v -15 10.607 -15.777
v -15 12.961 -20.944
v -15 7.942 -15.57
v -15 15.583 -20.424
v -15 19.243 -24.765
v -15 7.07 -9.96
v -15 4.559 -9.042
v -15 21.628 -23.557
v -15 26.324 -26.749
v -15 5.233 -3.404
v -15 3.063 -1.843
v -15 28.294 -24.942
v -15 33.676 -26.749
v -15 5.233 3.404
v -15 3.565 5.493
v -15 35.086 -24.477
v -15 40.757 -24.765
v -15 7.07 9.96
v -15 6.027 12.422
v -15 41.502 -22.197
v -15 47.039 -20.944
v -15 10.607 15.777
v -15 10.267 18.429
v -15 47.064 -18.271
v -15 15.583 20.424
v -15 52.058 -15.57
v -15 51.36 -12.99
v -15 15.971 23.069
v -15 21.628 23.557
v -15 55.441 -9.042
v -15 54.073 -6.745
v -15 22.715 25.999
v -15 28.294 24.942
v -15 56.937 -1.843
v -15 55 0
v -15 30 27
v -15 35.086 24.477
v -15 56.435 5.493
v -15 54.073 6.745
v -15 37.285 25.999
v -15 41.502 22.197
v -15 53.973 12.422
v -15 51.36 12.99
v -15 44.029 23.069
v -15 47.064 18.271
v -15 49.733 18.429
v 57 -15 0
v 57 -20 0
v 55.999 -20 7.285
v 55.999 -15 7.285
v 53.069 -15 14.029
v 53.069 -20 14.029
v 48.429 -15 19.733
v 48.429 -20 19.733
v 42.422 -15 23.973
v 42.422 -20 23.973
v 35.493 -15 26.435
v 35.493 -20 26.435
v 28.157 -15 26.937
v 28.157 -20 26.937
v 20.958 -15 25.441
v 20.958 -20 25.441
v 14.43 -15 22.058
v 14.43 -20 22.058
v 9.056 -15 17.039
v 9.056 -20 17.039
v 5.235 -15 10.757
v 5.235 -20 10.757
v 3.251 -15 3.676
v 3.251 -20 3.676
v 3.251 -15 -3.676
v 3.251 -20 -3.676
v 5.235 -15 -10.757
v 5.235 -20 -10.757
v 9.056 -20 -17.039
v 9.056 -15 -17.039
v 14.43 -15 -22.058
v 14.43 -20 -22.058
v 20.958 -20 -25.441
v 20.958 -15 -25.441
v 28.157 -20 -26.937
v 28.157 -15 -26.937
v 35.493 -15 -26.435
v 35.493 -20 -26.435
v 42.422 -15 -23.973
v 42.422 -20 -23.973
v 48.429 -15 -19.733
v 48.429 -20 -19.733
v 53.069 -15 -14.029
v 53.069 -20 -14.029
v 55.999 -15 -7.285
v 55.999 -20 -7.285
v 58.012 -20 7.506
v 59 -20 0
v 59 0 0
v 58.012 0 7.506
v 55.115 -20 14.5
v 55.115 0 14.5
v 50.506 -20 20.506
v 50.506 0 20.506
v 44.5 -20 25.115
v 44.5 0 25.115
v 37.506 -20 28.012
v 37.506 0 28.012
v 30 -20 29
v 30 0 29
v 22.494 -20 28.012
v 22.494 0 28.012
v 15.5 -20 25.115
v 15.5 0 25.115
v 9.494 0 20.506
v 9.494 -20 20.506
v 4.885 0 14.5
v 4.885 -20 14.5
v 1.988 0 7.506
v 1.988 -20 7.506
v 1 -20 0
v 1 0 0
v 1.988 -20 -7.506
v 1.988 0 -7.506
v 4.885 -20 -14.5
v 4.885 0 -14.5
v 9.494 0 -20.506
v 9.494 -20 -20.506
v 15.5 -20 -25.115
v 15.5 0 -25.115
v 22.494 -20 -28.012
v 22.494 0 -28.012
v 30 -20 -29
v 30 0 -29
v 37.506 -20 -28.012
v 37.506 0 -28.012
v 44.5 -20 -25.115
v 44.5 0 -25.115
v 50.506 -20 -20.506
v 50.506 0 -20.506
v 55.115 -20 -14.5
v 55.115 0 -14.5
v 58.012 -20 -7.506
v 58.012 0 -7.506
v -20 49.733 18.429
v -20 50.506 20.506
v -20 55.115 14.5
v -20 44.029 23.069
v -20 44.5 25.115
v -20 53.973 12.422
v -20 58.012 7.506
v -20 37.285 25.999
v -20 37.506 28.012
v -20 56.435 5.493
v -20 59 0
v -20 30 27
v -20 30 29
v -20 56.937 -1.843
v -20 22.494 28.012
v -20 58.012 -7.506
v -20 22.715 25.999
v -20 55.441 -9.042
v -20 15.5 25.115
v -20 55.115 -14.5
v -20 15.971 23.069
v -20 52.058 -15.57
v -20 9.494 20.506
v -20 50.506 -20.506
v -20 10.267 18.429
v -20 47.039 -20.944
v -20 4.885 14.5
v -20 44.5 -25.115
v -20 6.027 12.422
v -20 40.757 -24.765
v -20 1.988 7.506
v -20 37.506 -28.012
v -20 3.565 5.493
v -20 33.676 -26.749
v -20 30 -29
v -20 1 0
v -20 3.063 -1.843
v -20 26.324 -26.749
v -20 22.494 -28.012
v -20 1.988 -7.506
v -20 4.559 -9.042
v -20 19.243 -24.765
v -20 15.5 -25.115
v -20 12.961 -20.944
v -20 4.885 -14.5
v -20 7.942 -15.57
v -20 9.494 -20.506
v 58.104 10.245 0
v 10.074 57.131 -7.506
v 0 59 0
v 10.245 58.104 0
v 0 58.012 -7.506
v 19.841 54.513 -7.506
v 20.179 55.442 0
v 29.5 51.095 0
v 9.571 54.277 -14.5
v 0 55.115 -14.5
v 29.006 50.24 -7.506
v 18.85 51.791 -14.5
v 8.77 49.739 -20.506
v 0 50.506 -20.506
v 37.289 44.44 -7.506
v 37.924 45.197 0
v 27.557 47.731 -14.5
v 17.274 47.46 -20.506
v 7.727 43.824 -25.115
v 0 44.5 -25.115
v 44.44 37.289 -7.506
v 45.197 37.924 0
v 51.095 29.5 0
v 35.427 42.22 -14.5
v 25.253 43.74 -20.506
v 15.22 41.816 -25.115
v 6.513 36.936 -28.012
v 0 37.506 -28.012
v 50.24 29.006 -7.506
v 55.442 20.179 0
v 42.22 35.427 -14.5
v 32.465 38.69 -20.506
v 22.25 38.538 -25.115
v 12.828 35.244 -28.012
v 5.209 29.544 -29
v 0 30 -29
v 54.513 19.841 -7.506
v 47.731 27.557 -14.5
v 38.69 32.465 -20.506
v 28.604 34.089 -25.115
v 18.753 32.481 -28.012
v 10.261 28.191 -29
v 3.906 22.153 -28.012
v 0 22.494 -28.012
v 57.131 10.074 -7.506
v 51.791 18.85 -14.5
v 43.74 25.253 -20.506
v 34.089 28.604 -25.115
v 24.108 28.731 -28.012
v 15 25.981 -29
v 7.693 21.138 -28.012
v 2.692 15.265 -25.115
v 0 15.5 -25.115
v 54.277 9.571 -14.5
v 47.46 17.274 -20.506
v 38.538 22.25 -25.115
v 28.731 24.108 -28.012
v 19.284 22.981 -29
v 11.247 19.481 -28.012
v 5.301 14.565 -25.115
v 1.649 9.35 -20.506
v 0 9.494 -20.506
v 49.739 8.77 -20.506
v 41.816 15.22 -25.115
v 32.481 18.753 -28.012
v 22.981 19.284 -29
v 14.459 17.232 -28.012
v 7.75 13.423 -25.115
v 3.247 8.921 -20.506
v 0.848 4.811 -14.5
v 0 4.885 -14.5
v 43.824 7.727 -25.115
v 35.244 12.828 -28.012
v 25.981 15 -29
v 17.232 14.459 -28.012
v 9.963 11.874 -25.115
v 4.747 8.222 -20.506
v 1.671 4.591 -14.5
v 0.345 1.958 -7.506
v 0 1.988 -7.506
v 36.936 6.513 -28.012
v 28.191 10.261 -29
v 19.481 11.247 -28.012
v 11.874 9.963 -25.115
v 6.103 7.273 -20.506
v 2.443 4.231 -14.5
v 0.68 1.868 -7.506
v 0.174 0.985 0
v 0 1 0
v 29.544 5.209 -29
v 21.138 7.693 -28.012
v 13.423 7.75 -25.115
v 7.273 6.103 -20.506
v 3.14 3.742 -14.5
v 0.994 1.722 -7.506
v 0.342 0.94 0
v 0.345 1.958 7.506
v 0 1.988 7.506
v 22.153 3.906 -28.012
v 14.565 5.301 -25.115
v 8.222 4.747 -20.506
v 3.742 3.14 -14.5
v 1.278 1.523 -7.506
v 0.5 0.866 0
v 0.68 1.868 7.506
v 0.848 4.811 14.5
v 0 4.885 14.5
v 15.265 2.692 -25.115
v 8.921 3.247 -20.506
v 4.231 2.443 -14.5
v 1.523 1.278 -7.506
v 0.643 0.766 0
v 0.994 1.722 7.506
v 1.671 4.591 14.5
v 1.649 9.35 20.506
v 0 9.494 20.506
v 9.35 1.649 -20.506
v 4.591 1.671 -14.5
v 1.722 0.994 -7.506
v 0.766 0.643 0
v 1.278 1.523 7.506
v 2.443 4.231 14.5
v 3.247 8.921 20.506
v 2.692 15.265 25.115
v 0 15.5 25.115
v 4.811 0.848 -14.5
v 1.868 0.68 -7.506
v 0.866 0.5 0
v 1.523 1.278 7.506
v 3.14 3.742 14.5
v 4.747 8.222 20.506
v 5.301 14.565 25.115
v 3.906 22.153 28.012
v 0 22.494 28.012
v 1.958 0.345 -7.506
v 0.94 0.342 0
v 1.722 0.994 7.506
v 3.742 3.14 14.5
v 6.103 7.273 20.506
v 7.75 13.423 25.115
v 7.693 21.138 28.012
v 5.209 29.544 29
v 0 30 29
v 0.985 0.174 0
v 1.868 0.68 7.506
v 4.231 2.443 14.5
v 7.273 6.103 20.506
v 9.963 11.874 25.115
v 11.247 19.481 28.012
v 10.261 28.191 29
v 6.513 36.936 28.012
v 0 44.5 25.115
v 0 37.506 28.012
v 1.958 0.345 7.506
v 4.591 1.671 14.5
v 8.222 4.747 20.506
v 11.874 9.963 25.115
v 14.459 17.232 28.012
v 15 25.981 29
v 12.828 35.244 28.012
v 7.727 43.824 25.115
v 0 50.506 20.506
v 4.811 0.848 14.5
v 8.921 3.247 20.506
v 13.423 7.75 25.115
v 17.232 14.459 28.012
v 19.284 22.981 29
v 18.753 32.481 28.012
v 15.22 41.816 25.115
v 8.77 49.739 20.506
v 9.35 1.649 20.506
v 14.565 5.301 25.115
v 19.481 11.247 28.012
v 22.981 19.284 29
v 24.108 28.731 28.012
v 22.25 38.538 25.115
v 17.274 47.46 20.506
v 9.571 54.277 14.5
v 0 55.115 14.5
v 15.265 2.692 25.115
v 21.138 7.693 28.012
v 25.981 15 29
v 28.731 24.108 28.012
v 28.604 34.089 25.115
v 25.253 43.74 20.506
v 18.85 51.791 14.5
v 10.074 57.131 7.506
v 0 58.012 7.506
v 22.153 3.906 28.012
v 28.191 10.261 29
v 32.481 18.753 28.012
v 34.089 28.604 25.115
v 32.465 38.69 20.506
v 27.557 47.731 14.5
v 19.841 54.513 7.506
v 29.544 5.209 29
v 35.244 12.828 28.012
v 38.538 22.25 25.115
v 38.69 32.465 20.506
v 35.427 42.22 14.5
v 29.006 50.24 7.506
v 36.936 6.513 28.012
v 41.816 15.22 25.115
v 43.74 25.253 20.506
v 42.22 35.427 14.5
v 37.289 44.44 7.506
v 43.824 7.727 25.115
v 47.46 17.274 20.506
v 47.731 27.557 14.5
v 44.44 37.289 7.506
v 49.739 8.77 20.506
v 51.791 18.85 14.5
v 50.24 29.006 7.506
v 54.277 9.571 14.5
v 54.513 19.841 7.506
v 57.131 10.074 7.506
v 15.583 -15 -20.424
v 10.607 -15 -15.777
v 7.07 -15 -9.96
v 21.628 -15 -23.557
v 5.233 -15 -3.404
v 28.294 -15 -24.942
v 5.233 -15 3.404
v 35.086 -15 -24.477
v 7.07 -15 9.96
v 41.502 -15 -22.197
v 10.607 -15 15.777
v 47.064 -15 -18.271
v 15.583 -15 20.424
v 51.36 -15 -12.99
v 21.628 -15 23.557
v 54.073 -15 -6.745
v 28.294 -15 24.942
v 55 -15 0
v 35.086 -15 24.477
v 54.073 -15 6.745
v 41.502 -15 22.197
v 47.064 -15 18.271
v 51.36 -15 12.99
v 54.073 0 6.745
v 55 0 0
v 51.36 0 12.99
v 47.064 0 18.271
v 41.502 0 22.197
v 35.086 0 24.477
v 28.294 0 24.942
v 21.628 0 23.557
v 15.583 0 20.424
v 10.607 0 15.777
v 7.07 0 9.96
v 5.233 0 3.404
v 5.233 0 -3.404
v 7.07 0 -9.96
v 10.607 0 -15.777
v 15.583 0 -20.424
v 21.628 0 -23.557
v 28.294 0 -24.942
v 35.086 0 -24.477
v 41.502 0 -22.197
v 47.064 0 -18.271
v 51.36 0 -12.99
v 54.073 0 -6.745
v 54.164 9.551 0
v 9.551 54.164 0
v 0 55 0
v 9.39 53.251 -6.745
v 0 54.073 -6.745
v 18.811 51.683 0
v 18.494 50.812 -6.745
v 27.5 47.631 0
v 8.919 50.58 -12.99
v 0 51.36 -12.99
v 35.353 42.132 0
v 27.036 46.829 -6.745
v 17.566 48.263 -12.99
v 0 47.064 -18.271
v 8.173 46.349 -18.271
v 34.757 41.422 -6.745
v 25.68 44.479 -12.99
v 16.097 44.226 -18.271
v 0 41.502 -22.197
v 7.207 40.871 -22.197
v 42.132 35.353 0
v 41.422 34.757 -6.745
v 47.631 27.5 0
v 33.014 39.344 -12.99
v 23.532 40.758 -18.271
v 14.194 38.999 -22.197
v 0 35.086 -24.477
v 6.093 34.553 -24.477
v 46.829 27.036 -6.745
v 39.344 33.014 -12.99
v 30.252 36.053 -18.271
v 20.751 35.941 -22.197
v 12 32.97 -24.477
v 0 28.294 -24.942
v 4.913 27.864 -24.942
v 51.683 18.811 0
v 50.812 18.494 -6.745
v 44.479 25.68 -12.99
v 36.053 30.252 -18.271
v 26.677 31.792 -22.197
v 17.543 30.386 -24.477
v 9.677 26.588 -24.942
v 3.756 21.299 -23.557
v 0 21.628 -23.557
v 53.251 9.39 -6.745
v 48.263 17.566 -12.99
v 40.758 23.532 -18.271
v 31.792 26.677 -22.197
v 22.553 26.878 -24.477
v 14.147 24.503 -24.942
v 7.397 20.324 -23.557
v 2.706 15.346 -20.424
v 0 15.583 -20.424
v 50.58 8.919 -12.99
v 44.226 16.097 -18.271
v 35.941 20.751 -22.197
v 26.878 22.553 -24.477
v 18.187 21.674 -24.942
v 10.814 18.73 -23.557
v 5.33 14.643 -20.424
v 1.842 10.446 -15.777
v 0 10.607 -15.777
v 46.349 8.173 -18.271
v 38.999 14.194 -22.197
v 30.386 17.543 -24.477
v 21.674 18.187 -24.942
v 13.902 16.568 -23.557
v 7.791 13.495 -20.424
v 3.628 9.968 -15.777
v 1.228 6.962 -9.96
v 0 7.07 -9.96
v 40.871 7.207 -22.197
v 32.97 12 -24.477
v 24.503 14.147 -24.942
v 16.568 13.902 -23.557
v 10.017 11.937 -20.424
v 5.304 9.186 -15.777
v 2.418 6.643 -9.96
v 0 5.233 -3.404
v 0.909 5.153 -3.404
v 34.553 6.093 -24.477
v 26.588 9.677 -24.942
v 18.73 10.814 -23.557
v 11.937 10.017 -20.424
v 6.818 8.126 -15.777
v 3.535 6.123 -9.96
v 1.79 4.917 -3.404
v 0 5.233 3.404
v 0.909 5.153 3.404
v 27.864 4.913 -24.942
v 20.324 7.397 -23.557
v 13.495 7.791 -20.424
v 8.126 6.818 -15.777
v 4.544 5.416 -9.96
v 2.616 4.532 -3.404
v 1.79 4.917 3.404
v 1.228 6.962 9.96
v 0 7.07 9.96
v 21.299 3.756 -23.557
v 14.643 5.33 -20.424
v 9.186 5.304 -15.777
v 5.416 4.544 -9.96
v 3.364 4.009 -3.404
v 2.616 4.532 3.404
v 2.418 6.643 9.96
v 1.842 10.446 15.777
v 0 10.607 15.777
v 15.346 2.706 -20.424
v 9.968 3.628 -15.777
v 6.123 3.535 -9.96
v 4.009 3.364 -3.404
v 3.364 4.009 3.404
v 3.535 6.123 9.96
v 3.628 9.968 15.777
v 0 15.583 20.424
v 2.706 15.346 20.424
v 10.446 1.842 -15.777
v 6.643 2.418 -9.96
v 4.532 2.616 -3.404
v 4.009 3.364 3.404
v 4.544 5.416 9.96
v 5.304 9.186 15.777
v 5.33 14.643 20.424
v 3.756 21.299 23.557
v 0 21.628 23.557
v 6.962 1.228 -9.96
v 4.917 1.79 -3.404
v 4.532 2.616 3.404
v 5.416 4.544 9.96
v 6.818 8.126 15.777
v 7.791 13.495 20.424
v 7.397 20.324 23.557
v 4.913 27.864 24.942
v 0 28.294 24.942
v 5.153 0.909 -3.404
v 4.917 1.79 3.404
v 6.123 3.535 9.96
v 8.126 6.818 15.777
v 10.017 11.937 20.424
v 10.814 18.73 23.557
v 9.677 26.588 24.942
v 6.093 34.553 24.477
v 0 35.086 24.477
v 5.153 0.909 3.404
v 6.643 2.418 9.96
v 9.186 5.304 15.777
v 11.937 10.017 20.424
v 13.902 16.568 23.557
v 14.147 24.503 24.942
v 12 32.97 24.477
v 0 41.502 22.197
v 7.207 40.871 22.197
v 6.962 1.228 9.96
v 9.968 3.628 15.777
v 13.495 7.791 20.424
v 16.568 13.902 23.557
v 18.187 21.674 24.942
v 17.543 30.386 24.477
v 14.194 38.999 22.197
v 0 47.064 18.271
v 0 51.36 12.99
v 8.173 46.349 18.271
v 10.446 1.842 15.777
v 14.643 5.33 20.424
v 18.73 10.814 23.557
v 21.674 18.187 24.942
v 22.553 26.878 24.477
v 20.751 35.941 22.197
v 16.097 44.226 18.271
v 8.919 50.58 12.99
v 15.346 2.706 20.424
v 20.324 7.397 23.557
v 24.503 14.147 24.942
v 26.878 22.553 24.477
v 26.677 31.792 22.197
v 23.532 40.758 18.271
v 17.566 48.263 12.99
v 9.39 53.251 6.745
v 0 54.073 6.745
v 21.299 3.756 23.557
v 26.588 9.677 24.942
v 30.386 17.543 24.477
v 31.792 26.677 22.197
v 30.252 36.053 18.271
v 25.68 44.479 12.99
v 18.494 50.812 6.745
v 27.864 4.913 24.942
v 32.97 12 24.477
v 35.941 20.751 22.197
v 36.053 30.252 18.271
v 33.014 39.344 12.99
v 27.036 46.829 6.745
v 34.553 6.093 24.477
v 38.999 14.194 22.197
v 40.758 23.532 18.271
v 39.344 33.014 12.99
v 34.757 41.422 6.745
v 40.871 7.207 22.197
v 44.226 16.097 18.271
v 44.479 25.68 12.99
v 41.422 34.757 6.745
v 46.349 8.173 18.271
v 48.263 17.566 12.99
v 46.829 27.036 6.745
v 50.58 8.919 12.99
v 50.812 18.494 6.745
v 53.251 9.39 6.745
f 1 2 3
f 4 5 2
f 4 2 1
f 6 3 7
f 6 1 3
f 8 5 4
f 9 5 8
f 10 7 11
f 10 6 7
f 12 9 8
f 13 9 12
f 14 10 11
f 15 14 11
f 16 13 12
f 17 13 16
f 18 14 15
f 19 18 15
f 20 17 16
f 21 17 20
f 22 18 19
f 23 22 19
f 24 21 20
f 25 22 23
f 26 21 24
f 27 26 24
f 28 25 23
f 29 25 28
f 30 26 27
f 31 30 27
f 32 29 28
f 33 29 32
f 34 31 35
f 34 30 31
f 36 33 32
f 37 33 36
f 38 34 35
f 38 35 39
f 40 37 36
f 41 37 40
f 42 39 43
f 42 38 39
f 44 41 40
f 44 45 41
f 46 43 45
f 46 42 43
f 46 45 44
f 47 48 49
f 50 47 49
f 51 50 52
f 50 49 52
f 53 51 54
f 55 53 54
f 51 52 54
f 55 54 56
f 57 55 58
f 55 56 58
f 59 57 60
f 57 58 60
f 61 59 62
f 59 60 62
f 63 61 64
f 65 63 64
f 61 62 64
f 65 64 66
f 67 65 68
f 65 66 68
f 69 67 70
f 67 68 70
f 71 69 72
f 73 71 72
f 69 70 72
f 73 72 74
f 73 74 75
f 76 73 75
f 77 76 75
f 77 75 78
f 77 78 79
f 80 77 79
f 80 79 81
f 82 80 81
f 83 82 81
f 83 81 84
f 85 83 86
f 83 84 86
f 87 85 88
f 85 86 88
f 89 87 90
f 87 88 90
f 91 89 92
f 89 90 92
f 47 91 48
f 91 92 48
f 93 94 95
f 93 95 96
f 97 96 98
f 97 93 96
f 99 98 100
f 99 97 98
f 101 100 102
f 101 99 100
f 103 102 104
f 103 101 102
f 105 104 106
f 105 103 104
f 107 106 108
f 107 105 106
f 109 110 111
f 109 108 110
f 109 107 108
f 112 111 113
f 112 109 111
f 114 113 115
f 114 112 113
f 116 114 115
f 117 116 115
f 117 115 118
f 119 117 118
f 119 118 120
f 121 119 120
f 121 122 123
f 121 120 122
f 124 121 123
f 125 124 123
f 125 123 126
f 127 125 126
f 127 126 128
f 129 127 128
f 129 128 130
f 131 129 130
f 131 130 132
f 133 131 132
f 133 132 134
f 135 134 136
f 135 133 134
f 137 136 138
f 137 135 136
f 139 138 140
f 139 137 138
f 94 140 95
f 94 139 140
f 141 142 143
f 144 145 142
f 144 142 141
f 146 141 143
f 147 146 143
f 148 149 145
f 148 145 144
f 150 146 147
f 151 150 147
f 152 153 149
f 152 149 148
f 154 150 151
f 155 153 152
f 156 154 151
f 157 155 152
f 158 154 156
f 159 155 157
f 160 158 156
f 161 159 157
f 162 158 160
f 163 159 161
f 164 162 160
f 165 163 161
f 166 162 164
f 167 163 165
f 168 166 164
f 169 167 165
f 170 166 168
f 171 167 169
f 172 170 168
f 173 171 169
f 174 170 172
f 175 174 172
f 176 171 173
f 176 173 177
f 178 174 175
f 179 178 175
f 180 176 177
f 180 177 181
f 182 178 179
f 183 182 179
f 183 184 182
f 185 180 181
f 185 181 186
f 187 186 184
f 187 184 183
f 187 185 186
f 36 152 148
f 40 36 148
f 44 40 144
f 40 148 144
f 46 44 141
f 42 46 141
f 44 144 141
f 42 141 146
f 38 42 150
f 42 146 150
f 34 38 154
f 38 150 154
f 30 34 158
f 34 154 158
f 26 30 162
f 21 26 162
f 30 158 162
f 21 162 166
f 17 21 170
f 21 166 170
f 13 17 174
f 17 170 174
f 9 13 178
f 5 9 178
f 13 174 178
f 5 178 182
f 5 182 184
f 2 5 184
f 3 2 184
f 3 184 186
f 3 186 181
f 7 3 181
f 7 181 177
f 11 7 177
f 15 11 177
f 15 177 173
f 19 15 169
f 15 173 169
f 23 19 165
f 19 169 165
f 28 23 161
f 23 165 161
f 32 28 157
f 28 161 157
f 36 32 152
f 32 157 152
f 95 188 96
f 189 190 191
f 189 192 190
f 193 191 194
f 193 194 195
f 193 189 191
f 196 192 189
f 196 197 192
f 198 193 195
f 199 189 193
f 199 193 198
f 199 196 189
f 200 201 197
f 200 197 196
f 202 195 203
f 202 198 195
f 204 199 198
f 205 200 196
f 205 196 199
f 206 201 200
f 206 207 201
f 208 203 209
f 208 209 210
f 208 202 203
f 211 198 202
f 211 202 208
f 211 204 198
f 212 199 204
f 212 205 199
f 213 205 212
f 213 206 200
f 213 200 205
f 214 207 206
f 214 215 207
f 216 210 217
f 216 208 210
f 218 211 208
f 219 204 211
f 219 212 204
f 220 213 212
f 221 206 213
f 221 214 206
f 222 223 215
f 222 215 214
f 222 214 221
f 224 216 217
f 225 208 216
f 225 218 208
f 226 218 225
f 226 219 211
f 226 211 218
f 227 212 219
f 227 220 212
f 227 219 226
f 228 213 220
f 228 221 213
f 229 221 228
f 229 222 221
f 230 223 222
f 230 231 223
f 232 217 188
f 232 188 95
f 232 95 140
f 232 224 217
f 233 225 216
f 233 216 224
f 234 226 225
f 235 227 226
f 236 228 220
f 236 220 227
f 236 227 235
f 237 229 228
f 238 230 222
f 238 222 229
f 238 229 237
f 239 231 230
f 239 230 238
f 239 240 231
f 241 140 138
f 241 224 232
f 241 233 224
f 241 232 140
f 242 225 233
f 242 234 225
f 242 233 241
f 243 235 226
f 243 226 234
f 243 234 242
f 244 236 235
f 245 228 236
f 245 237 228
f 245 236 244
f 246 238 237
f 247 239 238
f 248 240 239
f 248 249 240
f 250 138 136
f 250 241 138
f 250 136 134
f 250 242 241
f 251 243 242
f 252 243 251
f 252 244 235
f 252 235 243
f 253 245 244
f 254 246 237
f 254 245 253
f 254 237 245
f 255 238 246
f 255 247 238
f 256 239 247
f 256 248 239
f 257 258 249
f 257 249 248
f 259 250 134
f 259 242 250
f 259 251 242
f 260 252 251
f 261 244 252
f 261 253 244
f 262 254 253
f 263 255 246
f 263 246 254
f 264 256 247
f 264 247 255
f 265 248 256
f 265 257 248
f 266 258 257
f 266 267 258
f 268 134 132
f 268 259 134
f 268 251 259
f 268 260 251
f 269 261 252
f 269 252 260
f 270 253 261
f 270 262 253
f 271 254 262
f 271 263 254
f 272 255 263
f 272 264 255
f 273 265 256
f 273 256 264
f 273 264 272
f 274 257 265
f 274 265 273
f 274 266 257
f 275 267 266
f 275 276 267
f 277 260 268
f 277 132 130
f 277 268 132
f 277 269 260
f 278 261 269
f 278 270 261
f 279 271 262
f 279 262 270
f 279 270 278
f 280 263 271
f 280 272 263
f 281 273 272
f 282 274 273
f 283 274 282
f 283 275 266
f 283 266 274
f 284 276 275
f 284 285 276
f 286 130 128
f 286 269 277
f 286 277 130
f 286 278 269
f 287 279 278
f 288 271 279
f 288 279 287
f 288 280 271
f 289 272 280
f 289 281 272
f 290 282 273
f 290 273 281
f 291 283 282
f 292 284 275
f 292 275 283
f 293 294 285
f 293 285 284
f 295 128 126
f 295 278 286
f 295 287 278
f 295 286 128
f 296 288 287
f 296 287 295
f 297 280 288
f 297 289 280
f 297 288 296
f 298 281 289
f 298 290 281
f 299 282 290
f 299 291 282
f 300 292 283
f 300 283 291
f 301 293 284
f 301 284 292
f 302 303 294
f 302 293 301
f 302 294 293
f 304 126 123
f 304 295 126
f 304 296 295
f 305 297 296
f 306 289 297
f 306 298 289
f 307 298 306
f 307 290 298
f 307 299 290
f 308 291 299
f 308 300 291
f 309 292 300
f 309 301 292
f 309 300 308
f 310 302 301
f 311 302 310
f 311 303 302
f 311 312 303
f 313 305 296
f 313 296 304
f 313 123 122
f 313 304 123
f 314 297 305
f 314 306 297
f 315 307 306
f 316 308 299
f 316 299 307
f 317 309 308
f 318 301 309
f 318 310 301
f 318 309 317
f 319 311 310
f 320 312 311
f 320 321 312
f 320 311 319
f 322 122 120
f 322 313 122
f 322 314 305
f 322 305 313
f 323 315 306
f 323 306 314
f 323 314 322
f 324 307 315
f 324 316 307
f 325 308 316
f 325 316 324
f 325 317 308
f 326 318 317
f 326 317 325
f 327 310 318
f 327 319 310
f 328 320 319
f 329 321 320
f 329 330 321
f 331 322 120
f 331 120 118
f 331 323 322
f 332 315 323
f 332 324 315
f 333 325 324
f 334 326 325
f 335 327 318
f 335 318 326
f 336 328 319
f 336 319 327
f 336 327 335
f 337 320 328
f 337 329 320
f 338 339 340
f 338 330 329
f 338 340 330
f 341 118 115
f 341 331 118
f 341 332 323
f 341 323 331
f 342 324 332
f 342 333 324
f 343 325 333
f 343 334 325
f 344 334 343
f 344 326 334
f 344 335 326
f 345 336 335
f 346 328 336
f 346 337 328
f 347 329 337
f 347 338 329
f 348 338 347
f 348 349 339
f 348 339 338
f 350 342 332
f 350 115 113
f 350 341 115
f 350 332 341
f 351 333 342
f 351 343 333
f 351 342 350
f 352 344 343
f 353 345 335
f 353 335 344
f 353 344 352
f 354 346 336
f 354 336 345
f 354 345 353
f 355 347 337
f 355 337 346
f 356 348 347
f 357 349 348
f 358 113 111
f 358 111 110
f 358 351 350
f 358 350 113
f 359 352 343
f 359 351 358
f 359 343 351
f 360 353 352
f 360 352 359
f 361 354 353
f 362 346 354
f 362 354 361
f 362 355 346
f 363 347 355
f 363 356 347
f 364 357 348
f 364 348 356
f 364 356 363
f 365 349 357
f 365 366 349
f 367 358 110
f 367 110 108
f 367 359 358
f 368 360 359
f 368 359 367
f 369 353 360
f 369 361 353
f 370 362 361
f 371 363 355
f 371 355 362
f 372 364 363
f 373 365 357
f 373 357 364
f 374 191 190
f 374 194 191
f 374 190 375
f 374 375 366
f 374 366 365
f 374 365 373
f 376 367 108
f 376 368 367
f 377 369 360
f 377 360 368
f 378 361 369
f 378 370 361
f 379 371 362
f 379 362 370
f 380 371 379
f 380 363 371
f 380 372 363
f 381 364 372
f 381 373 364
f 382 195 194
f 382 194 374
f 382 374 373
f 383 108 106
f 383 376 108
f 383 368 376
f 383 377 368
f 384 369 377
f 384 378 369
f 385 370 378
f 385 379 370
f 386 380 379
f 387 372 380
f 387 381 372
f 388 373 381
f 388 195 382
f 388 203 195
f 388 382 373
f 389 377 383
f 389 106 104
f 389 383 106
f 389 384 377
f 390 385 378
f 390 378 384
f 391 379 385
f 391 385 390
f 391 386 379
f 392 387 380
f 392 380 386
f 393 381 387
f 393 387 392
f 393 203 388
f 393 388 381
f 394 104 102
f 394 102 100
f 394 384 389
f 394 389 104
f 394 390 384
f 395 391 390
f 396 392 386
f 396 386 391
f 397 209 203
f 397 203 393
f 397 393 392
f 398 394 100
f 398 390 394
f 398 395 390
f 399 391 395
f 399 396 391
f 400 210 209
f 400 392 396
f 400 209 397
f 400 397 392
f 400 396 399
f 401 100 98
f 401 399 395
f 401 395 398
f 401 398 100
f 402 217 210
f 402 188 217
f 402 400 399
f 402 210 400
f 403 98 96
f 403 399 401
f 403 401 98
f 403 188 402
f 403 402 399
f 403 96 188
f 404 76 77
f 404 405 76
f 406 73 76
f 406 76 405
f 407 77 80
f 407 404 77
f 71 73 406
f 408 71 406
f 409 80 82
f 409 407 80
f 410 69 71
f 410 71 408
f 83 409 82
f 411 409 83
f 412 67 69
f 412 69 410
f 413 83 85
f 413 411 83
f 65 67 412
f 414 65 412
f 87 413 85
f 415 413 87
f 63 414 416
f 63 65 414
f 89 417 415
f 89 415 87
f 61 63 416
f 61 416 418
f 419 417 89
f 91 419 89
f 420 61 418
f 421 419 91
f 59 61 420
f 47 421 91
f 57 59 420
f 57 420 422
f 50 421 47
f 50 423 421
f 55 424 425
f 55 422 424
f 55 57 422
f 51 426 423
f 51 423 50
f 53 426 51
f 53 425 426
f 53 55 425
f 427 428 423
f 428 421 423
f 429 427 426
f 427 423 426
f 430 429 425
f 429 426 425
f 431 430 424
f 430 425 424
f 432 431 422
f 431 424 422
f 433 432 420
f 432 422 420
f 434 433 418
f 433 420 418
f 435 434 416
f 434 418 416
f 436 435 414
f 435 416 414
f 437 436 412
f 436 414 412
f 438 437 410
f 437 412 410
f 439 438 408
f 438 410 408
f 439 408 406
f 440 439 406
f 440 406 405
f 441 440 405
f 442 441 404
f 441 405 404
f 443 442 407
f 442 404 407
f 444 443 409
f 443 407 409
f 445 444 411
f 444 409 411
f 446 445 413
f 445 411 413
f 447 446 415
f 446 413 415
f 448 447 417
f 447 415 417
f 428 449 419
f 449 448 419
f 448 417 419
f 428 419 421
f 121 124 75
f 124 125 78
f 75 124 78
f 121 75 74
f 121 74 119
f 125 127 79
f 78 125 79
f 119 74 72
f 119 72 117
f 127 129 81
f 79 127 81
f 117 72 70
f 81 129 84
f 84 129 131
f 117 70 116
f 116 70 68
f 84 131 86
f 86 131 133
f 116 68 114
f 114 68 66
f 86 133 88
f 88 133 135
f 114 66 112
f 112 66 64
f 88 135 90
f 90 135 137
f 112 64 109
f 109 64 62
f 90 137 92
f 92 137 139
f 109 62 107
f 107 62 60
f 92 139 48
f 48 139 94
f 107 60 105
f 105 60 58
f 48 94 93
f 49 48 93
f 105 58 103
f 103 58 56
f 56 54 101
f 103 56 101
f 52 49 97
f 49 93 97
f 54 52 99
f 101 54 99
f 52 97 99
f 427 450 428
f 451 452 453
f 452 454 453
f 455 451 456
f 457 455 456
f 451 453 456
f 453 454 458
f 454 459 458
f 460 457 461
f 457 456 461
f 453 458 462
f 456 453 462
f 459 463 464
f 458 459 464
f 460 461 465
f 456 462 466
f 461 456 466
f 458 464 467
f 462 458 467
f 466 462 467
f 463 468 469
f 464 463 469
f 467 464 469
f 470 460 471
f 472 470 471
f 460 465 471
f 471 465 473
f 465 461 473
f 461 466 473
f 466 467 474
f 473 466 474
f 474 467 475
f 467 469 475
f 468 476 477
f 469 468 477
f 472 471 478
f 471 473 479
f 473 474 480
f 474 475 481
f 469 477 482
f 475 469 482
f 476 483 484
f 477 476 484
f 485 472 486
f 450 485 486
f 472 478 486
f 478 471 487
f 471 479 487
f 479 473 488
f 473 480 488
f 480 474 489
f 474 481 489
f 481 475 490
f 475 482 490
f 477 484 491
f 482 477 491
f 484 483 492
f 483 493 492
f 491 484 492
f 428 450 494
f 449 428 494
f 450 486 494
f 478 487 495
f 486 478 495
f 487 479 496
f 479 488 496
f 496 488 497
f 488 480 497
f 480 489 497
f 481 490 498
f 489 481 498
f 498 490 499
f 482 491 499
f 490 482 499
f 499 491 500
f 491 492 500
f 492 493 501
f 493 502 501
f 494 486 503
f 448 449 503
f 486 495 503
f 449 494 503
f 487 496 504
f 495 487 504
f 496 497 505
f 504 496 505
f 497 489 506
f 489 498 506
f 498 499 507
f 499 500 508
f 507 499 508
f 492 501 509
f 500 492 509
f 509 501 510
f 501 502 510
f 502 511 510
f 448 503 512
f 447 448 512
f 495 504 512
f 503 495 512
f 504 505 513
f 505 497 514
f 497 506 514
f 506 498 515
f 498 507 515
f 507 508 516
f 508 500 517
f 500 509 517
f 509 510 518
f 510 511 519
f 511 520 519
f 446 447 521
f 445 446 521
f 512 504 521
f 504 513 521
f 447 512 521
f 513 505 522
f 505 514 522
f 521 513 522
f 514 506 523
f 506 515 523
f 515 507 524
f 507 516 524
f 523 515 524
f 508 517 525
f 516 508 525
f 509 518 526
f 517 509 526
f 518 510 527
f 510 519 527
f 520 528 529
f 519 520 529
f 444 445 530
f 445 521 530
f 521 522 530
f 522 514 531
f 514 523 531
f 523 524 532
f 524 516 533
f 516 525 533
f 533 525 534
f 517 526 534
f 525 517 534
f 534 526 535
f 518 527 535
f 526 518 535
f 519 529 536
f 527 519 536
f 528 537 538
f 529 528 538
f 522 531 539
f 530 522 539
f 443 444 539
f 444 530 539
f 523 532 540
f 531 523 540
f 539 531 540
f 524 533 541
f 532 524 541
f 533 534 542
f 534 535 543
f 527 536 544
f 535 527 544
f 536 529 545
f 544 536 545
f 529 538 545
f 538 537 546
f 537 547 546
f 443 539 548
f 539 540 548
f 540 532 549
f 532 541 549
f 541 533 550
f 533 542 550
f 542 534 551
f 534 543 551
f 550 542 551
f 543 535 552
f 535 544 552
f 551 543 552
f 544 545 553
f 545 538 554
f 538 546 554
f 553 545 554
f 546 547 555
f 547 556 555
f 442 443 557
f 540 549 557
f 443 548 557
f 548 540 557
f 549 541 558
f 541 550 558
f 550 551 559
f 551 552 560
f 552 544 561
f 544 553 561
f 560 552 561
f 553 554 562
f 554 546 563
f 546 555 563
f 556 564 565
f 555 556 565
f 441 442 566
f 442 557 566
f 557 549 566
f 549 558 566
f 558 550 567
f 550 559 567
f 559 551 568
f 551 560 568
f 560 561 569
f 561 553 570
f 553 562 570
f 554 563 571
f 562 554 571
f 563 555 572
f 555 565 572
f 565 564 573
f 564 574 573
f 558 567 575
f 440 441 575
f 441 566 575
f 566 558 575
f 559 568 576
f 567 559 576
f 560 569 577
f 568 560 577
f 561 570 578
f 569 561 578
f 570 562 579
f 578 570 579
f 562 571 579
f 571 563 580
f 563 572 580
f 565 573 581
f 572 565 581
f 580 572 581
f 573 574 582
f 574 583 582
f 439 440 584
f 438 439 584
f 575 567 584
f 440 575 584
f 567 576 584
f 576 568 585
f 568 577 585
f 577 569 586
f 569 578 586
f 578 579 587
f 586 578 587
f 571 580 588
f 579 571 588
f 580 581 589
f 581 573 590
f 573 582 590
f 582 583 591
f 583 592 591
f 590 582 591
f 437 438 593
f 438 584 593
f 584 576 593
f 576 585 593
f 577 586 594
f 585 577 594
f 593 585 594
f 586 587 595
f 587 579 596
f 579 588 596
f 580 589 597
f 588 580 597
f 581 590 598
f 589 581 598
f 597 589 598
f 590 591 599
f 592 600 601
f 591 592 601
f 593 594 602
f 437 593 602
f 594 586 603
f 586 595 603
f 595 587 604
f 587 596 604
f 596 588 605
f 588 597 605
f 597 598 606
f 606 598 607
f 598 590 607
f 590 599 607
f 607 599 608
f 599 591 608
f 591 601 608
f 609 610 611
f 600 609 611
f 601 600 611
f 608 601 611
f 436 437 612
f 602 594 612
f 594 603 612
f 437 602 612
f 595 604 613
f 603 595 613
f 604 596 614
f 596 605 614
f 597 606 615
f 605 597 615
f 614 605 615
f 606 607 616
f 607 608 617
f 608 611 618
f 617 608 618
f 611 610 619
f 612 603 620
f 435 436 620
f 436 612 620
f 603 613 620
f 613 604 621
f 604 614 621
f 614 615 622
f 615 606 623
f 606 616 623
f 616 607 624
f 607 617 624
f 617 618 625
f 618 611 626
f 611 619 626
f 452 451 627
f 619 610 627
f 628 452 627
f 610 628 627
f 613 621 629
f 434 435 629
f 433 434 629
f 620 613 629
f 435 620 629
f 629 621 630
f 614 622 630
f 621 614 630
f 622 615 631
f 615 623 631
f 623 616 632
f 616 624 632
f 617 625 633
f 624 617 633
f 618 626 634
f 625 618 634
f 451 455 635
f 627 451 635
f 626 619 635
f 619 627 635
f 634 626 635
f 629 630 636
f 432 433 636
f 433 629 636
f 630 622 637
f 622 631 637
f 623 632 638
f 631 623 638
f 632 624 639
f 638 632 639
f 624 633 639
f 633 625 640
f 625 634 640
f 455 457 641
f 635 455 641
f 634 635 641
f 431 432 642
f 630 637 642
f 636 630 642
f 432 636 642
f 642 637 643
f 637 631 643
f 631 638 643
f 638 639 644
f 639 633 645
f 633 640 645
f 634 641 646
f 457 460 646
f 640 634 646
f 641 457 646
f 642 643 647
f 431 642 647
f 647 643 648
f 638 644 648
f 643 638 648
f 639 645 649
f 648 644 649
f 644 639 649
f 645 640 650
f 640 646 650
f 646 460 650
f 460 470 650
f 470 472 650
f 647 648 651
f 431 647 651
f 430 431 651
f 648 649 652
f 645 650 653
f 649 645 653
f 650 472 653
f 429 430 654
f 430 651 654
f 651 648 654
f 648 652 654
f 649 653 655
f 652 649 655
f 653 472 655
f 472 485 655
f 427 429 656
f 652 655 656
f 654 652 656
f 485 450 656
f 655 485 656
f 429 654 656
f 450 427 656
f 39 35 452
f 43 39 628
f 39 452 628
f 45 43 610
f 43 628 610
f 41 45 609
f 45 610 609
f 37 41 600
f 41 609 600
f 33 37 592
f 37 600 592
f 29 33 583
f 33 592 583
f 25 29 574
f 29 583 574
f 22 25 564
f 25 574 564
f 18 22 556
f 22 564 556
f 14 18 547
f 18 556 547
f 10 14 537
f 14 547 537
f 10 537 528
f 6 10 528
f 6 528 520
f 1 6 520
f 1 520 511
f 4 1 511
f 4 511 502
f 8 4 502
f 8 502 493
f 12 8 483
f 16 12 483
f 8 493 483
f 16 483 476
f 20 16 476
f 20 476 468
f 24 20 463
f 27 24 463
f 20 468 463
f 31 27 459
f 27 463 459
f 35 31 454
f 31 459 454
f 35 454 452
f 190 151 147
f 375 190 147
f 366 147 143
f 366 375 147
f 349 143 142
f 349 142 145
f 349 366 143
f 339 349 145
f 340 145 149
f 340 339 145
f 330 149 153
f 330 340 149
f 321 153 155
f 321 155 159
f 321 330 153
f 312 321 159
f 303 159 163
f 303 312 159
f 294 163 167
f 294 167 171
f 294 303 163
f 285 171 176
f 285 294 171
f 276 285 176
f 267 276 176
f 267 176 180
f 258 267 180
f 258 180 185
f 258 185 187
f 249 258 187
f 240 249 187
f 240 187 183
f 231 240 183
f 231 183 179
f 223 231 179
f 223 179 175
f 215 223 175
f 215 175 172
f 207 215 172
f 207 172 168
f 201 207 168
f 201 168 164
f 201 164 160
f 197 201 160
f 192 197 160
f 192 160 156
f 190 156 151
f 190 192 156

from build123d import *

# Parameters (mm, degrees)
SKETCH2_R          = 29
SKETCH2_R_2        = 25
SKETCH3_R          = 27
SKETCH3_R_2        = 25
CUT_EXTRUDE1_DEPTH = 5
SKETCH4_R          = 27
SKETCH4_R_2        = 25
CUT_EXTRUDE2_DEPTH = 5


with BuildPart() as part:
    # Sweep1: sweep along a path in Sketch1
    with BuildLine(Plane.XY) as sweep1_path:
        Line((-20, 30), (0, 30))
        ThreePointArc((0, 30), (21.213203436, 21.213203436), (30, 0))
        Line((30, 0), (30, -20))
    # Sketch2 → Sweep1 (sweep)
    with BuildSketch(Plane(origin=(0, -20, 0), x_dir=(1, 0, 0), z_dir=(0, 1, 0))):
        with Locations((30, 0)):
            Circle(SKETCH2_R)
        with Locations((30, 0)):
            Circle(SKETCH2_R_2, mode=Mode.SUBTRACT)
    sweep(path=sweep1_path.line)

    # Sketch3 → Cut-Extrude1 (cut)
    with BuildSketch(Plane.ZY.offset(20)):
        with Locations((0, 30)):
            Circle(SKETCH3_R)
        with Locations((0, 30)):
            Circle(SKETCH3_R_2, mode=Mode.SUBTRACT)
    extrude(amount=-CUT_EXTRUDE1_DEPTH, mode=Mode.SUBTRACT)

    # Sketch4 → Cut-Extrude2 (cut)
    with BuildSketch(Plane.XZ.offset(20)):
        with Locations((30, 0)):
            Circle(SKETCH4_R)
        with Locations((30, 0)):
            Circle(SKETCH4_R_2, mode=Mode.SUBTRACT)
    extrude(amount=-CUT_EXTRUDE2_DEPTH, mode=Mode.SUBTRACT)


solid = part.part
